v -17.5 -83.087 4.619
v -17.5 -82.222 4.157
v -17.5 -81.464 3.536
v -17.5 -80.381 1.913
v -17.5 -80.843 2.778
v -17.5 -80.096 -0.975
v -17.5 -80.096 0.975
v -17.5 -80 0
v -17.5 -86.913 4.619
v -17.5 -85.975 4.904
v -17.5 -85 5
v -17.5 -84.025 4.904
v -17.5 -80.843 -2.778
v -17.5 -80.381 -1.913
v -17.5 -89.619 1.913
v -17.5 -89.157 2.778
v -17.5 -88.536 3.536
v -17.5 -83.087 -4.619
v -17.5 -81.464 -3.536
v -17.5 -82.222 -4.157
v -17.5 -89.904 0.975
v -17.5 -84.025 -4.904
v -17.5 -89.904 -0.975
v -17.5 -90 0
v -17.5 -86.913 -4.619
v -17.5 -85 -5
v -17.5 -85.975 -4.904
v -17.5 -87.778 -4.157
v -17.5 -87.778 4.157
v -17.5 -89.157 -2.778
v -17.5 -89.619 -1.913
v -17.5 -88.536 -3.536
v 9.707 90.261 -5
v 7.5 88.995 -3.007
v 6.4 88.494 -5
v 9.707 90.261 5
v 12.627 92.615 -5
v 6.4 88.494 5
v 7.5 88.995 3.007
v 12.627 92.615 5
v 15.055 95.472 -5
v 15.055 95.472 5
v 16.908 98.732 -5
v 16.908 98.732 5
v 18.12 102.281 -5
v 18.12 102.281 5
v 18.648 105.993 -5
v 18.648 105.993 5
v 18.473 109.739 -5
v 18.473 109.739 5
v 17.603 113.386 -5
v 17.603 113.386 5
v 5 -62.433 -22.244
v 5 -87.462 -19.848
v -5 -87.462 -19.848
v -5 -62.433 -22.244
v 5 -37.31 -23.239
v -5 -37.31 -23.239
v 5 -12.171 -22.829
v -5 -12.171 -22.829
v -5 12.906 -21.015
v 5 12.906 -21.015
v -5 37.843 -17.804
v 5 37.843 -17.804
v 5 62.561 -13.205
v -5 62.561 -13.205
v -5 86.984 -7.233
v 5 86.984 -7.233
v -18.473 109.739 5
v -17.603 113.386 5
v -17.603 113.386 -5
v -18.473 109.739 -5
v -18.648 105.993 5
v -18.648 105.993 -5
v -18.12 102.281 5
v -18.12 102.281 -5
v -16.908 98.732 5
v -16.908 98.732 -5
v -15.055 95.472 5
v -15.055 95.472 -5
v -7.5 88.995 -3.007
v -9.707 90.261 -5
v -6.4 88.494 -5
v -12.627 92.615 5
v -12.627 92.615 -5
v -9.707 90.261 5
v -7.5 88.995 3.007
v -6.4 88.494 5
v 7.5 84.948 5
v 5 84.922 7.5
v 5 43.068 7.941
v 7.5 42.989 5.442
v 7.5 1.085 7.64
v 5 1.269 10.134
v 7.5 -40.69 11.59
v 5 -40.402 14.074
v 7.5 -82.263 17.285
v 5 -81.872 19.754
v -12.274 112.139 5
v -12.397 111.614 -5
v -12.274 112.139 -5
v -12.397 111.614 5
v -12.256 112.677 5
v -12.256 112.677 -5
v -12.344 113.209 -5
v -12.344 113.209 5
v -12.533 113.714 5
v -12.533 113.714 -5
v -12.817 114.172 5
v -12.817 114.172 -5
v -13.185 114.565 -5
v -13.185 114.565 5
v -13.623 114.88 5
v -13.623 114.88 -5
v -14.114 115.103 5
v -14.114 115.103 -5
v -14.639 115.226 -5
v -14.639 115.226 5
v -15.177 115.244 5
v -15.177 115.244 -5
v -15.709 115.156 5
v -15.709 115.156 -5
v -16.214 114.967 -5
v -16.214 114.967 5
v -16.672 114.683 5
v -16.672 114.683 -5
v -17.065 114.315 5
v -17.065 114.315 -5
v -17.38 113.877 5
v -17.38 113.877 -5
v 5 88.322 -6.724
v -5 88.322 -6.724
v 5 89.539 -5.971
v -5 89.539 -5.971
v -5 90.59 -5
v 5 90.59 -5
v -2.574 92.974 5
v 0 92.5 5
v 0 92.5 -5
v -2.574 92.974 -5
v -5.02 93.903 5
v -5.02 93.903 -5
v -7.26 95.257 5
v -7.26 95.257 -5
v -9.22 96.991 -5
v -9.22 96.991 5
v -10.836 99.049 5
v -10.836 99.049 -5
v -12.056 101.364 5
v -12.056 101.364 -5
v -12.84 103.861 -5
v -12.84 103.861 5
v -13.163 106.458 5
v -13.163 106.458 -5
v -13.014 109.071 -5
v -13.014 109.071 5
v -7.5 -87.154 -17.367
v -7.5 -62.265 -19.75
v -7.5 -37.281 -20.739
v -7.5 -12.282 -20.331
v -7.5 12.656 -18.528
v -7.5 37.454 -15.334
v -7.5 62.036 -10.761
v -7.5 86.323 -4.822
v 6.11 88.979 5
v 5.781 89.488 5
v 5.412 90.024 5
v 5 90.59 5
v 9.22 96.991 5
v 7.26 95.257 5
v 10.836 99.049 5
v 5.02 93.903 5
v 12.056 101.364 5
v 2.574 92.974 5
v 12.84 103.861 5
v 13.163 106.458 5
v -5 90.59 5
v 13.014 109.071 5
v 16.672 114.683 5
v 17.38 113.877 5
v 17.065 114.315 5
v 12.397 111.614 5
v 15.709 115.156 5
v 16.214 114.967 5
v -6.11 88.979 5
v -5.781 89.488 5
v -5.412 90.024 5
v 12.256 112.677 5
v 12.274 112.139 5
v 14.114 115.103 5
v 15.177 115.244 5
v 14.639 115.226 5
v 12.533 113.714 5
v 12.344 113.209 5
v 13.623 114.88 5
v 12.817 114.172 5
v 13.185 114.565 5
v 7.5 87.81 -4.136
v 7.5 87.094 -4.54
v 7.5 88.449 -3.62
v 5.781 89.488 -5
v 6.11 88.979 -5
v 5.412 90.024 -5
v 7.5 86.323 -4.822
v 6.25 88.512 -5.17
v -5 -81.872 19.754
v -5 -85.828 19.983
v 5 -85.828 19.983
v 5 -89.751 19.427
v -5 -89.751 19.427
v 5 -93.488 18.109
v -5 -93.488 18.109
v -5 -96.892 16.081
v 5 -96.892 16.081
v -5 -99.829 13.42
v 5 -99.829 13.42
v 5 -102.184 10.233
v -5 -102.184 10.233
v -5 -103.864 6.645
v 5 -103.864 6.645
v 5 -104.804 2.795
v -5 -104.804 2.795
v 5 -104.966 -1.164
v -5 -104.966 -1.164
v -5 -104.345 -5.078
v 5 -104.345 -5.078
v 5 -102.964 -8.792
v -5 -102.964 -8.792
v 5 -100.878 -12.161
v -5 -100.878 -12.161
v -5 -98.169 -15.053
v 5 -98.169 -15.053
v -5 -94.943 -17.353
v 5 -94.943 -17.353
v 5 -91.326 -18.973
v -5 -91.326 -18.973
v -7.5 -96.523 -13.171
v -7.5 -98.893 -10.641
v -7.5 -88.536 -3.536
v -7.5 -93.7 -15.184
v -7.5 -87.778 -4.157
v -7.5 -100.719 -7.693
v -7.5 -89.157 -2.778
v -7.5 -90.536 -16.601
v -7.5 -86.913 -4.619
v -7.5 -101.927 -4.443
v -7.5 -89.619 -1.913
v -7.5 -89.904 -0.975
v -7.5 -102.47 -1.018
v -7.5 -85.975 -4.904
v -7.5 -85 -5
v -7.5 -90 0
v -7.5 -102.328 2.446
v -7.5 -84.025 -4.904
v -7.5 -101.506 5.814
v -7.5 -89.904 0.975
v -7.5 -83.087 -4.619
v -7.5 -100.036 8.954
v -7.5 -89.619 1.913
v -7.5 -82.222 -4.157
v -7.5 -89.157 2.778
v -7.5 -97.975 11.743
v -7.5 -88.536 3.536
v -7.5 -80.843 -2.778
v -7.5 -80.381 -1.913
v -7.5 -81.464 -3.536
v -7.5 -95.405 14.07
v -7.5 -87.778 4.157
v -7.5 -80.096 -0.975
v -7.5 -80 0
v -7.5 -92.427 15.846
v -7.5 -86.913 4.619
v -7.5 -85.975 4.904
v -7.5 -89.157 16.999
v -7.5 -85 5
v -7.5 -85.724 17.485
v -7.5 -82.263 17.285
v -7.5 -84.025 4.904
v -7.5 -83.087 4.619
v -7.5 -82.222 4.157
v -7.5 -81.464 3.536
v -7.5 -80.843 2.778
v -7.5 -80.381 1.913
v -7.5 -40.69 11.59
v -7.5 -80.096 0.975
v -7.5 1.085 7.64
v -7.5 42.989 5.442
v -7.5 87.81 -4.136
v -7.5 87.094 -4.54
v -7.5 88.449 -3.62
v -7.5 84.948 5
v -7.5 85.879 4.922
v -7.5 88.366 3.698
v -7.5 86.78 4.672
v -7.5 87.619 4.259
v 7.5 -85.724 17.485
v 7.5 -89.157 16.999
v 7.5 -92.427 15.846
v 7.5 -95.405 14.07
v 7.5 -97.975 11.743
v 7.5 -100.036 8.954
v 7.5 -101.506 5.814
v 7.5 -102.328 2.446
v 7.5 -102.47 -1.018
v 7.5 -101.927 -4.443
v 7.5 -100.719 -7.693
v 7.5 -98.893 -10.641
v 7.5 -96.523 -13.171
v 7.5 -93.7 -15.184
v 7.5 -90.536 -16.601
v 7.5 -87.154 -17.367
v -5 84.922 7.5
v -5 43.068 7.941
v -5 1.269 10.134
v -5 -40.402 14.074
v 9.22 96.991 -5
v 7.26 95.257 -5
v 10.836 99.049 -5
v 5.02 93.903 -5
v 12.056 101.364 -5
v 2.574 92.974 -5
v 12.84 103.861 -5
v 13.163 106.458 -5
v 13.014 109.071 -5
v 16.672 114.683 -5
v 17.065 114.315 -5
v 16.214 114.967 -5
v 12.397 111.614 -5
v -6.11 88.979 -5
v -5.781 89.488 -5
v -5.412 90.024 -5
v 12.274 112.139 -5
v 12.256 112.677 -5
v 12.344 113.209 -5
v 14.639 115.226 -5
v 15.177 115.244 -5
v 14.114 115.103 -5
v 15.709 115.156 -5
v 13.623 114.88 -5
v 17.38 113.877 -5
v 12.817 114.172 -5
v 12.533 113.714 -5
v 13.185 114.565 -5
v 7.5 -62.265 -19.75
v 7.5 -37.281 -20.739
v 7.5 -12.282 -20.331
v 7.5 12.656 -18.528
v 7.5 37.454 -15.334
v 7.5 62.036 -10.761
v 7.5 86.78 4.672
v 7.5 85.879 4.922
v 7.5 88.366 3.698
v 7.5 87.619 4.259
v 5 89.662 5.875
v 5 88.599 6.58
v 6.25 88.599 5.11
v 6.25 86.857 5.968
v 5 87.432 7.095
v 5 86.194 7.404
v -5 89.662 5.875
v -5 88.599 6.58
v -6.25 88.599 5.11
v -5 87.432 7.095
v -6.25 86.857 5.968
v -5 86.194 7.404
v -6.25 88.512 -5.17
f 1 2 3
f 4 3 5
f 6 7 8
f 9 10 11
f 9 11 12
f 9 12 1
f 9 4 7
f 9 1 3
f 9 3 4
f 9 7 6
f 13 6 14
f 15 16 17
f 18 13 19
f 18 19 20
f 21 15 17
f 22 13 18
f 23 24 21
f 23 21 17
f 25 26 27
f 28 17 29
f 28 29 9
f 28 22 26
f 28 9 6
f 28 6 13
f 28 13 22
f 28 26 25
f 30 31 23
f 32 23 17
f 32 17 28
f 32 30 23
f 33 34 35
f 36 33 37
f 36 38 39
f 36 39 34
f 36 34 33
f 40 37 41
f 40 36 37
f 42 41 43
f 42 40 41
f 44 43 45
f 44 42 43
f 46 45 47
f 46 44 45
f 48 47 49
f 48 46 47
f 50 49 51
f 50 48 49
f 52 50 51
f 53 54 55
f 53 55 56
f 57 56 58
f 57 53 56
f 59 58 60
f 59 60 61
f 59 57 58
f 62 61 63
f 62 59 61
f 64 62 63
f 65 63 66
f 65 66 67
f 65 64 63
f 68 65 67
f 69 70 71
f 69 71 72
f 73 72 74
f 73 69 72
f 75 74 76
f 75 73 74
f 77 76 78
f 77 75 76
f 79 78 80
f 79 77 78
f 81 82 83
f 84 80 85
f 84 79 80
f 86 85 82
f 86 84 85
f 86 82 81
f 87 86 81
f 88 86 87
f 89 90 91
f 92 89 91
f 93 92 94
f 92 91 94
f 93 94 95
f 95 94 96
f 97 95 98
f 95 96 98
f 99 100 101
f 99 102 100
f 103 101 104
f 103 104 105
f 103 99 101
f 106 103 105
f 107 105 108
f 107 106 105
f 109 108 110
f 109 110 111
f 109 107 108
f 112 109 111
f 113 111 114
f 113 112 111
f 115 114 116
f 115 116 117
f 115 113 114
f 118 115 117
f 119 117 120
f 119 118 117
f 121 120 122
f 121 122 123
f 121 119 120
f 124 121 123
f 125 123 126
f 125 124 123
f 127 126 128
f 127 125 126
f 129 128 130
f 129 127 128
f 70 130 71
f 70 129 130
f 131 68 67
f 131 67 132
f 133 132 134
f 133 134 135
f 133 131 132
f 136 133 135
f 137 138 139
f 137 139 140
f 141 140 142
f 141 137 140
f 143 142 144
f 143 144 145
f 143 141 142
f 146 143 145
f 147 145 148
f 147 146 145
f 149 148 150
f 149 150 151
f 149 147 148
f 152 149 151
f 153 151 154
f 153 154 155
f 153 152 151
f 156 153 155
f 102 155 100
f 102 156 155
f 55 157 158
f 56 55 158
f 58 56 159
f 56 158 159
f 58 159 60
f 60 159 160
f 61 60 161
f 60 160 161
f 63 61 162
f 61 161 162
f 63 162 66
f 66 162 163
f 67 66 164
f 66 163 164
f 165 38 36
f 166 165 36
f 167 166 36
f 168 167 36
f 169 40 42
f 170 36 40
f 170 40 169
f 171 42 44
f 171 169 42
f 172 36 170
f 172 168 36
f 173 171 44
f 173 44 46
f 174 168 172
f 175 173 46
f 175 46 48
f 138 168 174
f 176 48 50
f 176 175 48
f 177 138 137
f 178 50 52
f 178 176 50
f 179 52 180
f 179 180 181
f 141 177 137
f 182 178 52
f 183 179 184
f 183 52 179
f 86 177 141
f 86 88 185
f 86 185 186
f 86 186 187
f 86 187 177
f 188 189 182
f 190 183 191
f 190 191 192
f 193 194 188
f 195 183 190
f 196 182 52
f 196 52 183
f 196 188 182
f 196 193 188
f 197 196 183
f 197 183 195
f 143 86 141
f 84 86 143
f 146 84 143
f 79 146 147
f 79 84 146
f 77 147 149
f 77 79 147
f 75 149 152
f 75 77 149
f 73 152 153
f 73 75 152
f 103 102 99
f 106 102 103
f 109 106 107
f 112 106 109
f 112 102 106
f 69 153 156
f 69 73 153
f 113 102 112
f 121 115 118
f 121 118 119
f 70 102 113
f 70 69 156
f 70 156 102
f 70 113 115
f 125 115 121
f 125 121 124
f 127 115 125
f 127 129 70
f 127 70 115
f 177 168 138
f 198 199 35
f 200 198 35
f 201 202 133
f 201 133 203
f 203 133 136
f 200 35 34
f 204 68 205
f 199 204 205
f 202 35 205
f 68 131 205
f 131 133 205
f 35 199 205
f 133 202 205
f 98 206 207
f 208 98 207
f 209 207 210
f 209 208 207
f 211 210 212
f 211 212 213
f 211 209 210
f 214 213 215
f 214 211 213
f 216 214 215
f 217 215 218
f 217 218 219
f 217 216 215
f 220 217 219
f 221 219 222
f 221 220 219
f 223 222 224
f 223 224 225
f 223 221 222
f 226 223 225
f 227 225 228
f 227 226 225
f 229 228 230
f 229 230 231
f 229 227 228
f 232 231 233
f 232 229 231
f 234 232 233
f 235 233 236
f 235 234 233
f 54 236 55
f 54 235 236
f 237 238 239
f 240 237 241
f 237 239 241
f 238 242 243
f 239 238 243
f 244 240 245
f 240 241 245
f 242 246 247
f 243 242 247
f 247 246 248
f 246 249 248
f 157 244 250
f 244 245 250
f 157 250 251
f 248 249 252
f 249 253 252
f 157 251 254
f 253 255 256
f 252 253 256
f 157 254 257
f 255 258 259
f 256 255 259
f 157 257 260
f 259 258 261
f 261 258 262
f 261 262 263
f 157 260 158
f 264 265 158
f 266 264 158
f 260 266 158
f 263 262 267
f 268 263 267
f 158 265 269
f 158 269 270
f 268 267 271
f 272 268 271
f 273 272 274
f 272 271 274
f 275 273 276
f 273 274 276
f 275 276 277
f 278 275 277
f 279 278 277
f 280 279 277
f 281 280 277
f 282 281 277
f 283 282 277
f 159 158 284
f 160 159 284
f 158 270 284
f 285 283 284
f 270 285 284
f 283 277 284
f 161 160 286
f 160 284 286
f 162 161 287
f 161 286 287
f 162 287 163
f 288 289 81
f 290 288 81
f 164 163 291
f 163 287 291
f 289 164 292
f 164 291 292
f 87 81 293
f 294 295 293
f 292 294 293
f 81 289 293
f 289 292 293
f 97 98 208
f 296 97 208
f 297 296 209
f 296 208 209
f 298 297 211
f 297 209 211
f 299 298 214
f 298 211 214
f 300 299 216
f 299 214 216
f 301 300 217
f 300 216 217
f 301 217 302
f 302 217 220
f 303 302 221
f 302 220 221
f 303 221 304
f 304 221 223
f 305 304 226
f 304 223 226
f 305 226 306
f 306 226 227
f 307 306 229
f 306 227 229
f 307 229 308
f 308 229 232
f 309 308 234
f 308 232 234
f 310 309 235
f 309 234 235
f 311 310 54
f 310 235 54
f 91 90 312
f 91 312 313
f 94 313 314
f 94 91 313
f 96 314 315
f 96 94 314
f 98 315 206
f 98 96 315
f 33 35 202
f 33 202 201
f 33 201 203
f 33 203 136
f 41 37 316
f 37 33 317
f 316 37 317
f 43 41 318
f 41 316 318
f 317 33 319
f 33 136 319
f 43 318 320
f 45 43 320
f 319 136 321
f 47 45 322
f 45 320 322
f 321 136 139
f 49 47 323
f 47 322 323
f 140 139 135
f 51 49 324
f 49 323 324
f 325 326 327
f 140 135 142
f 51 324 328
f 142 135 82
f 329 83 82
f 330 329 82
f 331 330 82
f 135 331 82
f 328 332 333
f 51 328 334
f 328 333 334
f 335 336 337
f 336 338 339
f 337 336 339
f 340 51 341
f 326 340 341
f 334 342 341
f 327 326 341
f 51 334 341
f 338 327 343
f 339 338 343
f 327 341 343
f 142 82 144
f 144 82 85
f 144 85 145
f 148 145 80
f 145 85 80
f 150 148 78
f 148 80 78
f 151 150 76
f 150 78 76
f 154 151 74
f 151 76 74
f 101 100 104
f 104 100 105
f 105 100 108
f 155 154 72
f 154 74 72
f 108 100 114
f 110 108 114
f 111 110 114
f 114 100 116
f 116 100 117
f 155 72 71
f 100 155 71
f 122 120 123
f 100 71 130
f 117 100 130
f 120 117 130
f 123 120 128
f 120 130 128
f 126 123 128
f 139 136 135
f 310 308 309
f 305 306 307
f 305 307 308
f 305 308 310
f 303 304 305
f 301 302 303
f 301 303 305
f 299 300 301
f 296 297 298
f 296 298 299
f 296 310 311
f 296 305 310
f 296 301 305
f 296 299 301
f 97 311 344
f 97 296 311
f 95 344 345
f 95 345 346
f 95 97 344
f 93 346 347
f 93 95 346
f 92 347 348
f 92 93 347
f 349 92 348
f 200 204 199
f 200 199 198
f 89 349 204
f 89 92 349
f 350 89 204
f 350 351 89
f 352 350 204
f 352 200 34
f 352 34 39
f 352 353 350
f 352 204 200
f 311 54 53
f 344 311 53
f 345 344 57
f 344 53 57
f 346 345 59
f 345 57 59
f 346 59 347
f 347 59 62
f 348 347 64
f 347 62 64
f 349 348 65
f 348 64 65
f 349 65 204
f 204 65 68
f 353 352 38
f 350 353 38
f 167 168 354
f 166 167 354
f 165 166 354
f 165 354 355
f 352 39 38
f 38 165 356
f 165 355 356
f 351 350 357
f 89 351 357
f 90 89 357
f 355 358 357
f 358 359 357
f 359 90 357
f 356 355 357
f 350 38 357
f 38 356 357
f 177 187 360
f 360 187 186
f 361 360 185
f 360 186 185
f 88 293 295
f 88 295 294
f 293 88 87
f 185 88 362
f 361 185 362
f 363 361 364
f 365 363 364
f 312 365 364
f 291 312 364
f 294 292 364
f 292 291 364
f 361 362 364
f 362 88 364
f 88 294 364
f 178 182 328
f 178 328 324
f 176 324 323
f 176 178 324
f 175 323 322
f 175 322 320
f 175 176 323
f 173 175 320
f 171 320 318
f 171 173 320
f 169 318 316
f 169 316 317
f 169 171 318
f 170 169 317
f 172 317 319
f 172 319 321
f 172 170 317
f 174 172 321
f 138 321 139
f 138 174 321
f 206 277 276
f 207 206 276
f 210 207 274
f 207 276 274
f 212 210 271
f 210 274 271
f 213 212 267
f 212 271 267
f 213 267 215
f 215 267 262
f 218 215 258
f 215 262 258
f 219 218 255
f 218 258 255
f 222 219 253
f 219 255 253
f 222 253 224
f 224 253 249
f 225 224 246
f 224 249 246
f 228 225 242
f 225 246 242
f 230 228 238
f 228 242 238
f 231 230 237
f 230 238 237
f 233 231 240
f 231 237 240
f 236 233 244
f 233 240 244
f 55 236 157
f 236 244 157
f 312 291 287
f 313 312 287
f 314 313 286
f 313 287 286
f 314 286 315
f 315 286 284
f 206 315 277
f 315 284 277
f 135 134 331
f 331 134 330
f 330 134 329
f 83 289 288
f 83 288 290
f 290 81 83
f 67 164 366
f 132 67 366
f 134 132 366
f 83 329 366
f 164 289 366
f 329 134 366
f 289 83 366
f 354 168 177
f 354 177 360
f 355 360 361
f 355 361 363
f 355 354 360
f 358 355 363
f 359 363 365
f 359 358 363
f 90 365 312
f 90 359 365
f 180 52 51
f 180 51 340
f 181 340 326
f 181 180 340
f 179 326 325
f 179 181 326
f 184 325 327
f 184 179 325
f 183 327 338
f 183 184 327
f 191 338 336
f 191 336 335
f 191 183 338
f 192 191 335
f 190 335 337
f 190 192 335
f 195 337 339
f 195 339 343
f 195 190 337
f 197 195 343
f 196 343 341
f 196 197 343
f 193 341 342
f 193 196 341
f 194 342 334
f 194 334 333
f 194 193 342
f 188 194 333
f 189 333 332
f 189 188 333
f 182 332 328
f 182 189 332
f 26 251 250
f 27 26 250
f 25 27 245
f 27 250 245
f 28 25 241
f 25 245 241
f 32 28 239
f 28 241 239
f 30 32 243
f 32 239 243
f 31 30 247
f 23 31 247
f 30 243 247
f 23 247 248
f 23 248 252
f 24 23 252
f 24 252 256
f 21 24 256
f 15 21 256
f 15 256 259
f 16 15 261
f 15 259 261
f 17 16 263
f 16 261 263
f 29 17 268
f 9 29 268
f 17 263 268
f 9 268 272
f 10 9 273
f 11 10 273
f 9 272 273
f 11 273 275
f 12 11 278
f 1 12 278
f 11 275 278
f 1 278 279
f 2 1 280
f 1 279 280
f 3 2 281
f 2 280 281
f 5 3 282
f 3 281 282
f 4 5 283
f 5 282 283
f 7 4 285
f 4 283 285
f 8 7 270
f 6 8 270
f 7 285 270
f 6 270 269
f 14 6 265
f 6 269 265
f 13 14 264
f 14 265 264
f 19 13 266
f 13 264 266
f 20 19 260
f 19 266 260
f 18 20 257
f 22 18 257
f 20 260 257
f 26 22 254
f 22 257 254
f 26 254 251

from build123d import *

# Parameters (mm, degrees)
BOSS_EXTRUDE1_DEPTH = 7.5
CHAMFER1_SIZE       = 2.5
SKETCH2_R           = 5
BOSS_EXTRUDE2_DEPTH = 10
BOSS_EXTRUDE3_DEPTH = 5


with BuildPart() as part:
    # Sketch1 → Boss-Extrude1 (new, symmetric)
    with BuildSketch(Plane.YZ):
        with BuildLine():
            ThreePointArc((-81.871756055, 19.753837344), (-104.803696773, 2.795280684), (-87.461525308, -19.847944306))
            ThreePointArc((-87.461525308, -19.847944306), (0.380210023, -22.09713345), (86.984359422, -7.232725467))
            ThreePointArc((86.984359422, -7.232725467), (92.427584063, 1.039709088), (84.922137279, 7.499595816))
            ThreePointArc((84.922137279, 7.499595816), (1.268561005, 10.133701432), (-81.871756055, 19.753837344))
        make_face()
    extrude(amount=BOSS_EXTRUDE1_DEPTH, both=True)

    # Chamfer1
    chamfer1_edges = [part.edges().sort_by_distance(p)[0] for p in [
        (-7.5, 0.380210023, -22.09713345),
        (-7.5, -104.803696773, 2.795280684),
        (-7.5, 1.268561005, 10.133701432),
        (7.5, 0.380210023, -22.09713345),
        (7.5, -104.803696773, 2.795280684),
        (7.5, 1.268561005, 10.133701432),
    ]]
    chamfer(chamfer1_edges, length=CHAMFER1_SIZE)

    # Sketch2 → Boss-Extrude2 (add)
    with BuildSketch(Plane(origin=(-7.5, 0, 0), x_dir=(0, -1, 0), z_dir=(-1, 0, 0))):
        with Locations(Location((85, 0, 0), (0, 0, 270))):
            Circle(SKETCH2_R)
    extrude(amount=BOSS_EXTRUDE2_DEPTH)

    # Sketch4 → Boss-Extrude3 (add, symmetric)
    with BuildSketch(Plane(origin=(0, 0, 0), x_dir=(0, 1, 0), z_dir=(0, 0, 1))):
        with BuildLine():
            ThreePointArc((86.984359422, 0), (95.845428844, -15.310516356), (113.386137378, -17.602678336))
            ThreePointArc((113.386137378, -17.602678336), (115.102678336, -14.113862622), (111.613862622, -12.397321664))
            ThreePointArc((111.613862622, -12.397321664), (99.049040037, -10.836148037), (92.5, 0))
            ThreePointArc((92.5, 0), (99.049040037, 10.836148037), (111.613862622, 12.397321664))
            ThreePointArc((111.613862622, 12.397321664), (115.102678336, 14.113862622), (113.386137378, 17.602678336))
            ThreePointArc((113.386137378, 17.602678336), (95.845428844, 15.310516356), (86.984359422, 0))
        make_face()
    extrude(amount=BOSS_EXTRUDE3_DEPTH, both=True)


solid = part.part
